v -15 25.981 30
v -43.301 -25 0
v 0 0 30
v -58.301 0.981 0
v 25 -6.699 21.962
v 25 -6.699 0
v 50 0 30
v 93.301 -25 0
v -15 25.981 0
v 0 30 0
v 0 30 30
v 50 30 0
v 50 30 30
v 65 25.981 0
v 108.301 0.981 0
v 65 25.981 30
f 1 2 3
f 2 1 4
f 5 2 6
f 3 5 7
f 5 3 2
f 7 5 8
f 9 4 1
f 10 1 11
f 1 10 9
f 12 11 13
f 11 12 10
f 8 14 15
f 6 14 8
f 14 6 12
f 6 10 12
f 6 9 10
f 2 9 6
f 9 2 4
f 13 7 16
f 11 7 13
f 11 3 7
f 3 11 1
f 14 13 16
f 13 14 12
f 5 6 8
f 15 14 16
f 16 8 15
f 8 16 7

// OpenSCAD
angle = 60;

profile_w = 20;
profile_l = 40;

h = 30;
l = 50;
s = 5;

eps = 0.2;

sr = 2+0.4;
sl = 5;
shr = 4+0.4;


difference(){
union(){
    hull() {
    cube([profile_l+2*s,profile_w+2*s,h]);
    rotate([0,0,angle/2])translate([-(profile_l+2*s),profile_w+2*s,0]) rotate([90,0,0])linear_extrude(profile_w+2*s)polygon([[0,0],[l,0],[l,h]]);
    }
    hull() {
    cube([profile_l+2*s,profile_w+2*s,h]);
    translate([(profile_l+2*s),0,0])rotate([0,0,-angle/2])translate([(profile_l+2*s),0,0]) rotate([90,0,180]) linear_extrude(profile_w+2*s)polygon([[0,0],[l,0],[l,h]]);
    }
}

translate([s-eps/2,s-eps/2,0]) cube([profile_l+eps,profile_w+eps,h]);

}

//rotate([0,0,180-angle/2])translate([0,0,0]) rotate([90,0,180-angle/2])
//translate([(profile_l+2*s)*2,0,0]) rotate([90,0,180])


hull() {
cube([profile_l+2*s,profile_w+2*s,h]);
}


//
